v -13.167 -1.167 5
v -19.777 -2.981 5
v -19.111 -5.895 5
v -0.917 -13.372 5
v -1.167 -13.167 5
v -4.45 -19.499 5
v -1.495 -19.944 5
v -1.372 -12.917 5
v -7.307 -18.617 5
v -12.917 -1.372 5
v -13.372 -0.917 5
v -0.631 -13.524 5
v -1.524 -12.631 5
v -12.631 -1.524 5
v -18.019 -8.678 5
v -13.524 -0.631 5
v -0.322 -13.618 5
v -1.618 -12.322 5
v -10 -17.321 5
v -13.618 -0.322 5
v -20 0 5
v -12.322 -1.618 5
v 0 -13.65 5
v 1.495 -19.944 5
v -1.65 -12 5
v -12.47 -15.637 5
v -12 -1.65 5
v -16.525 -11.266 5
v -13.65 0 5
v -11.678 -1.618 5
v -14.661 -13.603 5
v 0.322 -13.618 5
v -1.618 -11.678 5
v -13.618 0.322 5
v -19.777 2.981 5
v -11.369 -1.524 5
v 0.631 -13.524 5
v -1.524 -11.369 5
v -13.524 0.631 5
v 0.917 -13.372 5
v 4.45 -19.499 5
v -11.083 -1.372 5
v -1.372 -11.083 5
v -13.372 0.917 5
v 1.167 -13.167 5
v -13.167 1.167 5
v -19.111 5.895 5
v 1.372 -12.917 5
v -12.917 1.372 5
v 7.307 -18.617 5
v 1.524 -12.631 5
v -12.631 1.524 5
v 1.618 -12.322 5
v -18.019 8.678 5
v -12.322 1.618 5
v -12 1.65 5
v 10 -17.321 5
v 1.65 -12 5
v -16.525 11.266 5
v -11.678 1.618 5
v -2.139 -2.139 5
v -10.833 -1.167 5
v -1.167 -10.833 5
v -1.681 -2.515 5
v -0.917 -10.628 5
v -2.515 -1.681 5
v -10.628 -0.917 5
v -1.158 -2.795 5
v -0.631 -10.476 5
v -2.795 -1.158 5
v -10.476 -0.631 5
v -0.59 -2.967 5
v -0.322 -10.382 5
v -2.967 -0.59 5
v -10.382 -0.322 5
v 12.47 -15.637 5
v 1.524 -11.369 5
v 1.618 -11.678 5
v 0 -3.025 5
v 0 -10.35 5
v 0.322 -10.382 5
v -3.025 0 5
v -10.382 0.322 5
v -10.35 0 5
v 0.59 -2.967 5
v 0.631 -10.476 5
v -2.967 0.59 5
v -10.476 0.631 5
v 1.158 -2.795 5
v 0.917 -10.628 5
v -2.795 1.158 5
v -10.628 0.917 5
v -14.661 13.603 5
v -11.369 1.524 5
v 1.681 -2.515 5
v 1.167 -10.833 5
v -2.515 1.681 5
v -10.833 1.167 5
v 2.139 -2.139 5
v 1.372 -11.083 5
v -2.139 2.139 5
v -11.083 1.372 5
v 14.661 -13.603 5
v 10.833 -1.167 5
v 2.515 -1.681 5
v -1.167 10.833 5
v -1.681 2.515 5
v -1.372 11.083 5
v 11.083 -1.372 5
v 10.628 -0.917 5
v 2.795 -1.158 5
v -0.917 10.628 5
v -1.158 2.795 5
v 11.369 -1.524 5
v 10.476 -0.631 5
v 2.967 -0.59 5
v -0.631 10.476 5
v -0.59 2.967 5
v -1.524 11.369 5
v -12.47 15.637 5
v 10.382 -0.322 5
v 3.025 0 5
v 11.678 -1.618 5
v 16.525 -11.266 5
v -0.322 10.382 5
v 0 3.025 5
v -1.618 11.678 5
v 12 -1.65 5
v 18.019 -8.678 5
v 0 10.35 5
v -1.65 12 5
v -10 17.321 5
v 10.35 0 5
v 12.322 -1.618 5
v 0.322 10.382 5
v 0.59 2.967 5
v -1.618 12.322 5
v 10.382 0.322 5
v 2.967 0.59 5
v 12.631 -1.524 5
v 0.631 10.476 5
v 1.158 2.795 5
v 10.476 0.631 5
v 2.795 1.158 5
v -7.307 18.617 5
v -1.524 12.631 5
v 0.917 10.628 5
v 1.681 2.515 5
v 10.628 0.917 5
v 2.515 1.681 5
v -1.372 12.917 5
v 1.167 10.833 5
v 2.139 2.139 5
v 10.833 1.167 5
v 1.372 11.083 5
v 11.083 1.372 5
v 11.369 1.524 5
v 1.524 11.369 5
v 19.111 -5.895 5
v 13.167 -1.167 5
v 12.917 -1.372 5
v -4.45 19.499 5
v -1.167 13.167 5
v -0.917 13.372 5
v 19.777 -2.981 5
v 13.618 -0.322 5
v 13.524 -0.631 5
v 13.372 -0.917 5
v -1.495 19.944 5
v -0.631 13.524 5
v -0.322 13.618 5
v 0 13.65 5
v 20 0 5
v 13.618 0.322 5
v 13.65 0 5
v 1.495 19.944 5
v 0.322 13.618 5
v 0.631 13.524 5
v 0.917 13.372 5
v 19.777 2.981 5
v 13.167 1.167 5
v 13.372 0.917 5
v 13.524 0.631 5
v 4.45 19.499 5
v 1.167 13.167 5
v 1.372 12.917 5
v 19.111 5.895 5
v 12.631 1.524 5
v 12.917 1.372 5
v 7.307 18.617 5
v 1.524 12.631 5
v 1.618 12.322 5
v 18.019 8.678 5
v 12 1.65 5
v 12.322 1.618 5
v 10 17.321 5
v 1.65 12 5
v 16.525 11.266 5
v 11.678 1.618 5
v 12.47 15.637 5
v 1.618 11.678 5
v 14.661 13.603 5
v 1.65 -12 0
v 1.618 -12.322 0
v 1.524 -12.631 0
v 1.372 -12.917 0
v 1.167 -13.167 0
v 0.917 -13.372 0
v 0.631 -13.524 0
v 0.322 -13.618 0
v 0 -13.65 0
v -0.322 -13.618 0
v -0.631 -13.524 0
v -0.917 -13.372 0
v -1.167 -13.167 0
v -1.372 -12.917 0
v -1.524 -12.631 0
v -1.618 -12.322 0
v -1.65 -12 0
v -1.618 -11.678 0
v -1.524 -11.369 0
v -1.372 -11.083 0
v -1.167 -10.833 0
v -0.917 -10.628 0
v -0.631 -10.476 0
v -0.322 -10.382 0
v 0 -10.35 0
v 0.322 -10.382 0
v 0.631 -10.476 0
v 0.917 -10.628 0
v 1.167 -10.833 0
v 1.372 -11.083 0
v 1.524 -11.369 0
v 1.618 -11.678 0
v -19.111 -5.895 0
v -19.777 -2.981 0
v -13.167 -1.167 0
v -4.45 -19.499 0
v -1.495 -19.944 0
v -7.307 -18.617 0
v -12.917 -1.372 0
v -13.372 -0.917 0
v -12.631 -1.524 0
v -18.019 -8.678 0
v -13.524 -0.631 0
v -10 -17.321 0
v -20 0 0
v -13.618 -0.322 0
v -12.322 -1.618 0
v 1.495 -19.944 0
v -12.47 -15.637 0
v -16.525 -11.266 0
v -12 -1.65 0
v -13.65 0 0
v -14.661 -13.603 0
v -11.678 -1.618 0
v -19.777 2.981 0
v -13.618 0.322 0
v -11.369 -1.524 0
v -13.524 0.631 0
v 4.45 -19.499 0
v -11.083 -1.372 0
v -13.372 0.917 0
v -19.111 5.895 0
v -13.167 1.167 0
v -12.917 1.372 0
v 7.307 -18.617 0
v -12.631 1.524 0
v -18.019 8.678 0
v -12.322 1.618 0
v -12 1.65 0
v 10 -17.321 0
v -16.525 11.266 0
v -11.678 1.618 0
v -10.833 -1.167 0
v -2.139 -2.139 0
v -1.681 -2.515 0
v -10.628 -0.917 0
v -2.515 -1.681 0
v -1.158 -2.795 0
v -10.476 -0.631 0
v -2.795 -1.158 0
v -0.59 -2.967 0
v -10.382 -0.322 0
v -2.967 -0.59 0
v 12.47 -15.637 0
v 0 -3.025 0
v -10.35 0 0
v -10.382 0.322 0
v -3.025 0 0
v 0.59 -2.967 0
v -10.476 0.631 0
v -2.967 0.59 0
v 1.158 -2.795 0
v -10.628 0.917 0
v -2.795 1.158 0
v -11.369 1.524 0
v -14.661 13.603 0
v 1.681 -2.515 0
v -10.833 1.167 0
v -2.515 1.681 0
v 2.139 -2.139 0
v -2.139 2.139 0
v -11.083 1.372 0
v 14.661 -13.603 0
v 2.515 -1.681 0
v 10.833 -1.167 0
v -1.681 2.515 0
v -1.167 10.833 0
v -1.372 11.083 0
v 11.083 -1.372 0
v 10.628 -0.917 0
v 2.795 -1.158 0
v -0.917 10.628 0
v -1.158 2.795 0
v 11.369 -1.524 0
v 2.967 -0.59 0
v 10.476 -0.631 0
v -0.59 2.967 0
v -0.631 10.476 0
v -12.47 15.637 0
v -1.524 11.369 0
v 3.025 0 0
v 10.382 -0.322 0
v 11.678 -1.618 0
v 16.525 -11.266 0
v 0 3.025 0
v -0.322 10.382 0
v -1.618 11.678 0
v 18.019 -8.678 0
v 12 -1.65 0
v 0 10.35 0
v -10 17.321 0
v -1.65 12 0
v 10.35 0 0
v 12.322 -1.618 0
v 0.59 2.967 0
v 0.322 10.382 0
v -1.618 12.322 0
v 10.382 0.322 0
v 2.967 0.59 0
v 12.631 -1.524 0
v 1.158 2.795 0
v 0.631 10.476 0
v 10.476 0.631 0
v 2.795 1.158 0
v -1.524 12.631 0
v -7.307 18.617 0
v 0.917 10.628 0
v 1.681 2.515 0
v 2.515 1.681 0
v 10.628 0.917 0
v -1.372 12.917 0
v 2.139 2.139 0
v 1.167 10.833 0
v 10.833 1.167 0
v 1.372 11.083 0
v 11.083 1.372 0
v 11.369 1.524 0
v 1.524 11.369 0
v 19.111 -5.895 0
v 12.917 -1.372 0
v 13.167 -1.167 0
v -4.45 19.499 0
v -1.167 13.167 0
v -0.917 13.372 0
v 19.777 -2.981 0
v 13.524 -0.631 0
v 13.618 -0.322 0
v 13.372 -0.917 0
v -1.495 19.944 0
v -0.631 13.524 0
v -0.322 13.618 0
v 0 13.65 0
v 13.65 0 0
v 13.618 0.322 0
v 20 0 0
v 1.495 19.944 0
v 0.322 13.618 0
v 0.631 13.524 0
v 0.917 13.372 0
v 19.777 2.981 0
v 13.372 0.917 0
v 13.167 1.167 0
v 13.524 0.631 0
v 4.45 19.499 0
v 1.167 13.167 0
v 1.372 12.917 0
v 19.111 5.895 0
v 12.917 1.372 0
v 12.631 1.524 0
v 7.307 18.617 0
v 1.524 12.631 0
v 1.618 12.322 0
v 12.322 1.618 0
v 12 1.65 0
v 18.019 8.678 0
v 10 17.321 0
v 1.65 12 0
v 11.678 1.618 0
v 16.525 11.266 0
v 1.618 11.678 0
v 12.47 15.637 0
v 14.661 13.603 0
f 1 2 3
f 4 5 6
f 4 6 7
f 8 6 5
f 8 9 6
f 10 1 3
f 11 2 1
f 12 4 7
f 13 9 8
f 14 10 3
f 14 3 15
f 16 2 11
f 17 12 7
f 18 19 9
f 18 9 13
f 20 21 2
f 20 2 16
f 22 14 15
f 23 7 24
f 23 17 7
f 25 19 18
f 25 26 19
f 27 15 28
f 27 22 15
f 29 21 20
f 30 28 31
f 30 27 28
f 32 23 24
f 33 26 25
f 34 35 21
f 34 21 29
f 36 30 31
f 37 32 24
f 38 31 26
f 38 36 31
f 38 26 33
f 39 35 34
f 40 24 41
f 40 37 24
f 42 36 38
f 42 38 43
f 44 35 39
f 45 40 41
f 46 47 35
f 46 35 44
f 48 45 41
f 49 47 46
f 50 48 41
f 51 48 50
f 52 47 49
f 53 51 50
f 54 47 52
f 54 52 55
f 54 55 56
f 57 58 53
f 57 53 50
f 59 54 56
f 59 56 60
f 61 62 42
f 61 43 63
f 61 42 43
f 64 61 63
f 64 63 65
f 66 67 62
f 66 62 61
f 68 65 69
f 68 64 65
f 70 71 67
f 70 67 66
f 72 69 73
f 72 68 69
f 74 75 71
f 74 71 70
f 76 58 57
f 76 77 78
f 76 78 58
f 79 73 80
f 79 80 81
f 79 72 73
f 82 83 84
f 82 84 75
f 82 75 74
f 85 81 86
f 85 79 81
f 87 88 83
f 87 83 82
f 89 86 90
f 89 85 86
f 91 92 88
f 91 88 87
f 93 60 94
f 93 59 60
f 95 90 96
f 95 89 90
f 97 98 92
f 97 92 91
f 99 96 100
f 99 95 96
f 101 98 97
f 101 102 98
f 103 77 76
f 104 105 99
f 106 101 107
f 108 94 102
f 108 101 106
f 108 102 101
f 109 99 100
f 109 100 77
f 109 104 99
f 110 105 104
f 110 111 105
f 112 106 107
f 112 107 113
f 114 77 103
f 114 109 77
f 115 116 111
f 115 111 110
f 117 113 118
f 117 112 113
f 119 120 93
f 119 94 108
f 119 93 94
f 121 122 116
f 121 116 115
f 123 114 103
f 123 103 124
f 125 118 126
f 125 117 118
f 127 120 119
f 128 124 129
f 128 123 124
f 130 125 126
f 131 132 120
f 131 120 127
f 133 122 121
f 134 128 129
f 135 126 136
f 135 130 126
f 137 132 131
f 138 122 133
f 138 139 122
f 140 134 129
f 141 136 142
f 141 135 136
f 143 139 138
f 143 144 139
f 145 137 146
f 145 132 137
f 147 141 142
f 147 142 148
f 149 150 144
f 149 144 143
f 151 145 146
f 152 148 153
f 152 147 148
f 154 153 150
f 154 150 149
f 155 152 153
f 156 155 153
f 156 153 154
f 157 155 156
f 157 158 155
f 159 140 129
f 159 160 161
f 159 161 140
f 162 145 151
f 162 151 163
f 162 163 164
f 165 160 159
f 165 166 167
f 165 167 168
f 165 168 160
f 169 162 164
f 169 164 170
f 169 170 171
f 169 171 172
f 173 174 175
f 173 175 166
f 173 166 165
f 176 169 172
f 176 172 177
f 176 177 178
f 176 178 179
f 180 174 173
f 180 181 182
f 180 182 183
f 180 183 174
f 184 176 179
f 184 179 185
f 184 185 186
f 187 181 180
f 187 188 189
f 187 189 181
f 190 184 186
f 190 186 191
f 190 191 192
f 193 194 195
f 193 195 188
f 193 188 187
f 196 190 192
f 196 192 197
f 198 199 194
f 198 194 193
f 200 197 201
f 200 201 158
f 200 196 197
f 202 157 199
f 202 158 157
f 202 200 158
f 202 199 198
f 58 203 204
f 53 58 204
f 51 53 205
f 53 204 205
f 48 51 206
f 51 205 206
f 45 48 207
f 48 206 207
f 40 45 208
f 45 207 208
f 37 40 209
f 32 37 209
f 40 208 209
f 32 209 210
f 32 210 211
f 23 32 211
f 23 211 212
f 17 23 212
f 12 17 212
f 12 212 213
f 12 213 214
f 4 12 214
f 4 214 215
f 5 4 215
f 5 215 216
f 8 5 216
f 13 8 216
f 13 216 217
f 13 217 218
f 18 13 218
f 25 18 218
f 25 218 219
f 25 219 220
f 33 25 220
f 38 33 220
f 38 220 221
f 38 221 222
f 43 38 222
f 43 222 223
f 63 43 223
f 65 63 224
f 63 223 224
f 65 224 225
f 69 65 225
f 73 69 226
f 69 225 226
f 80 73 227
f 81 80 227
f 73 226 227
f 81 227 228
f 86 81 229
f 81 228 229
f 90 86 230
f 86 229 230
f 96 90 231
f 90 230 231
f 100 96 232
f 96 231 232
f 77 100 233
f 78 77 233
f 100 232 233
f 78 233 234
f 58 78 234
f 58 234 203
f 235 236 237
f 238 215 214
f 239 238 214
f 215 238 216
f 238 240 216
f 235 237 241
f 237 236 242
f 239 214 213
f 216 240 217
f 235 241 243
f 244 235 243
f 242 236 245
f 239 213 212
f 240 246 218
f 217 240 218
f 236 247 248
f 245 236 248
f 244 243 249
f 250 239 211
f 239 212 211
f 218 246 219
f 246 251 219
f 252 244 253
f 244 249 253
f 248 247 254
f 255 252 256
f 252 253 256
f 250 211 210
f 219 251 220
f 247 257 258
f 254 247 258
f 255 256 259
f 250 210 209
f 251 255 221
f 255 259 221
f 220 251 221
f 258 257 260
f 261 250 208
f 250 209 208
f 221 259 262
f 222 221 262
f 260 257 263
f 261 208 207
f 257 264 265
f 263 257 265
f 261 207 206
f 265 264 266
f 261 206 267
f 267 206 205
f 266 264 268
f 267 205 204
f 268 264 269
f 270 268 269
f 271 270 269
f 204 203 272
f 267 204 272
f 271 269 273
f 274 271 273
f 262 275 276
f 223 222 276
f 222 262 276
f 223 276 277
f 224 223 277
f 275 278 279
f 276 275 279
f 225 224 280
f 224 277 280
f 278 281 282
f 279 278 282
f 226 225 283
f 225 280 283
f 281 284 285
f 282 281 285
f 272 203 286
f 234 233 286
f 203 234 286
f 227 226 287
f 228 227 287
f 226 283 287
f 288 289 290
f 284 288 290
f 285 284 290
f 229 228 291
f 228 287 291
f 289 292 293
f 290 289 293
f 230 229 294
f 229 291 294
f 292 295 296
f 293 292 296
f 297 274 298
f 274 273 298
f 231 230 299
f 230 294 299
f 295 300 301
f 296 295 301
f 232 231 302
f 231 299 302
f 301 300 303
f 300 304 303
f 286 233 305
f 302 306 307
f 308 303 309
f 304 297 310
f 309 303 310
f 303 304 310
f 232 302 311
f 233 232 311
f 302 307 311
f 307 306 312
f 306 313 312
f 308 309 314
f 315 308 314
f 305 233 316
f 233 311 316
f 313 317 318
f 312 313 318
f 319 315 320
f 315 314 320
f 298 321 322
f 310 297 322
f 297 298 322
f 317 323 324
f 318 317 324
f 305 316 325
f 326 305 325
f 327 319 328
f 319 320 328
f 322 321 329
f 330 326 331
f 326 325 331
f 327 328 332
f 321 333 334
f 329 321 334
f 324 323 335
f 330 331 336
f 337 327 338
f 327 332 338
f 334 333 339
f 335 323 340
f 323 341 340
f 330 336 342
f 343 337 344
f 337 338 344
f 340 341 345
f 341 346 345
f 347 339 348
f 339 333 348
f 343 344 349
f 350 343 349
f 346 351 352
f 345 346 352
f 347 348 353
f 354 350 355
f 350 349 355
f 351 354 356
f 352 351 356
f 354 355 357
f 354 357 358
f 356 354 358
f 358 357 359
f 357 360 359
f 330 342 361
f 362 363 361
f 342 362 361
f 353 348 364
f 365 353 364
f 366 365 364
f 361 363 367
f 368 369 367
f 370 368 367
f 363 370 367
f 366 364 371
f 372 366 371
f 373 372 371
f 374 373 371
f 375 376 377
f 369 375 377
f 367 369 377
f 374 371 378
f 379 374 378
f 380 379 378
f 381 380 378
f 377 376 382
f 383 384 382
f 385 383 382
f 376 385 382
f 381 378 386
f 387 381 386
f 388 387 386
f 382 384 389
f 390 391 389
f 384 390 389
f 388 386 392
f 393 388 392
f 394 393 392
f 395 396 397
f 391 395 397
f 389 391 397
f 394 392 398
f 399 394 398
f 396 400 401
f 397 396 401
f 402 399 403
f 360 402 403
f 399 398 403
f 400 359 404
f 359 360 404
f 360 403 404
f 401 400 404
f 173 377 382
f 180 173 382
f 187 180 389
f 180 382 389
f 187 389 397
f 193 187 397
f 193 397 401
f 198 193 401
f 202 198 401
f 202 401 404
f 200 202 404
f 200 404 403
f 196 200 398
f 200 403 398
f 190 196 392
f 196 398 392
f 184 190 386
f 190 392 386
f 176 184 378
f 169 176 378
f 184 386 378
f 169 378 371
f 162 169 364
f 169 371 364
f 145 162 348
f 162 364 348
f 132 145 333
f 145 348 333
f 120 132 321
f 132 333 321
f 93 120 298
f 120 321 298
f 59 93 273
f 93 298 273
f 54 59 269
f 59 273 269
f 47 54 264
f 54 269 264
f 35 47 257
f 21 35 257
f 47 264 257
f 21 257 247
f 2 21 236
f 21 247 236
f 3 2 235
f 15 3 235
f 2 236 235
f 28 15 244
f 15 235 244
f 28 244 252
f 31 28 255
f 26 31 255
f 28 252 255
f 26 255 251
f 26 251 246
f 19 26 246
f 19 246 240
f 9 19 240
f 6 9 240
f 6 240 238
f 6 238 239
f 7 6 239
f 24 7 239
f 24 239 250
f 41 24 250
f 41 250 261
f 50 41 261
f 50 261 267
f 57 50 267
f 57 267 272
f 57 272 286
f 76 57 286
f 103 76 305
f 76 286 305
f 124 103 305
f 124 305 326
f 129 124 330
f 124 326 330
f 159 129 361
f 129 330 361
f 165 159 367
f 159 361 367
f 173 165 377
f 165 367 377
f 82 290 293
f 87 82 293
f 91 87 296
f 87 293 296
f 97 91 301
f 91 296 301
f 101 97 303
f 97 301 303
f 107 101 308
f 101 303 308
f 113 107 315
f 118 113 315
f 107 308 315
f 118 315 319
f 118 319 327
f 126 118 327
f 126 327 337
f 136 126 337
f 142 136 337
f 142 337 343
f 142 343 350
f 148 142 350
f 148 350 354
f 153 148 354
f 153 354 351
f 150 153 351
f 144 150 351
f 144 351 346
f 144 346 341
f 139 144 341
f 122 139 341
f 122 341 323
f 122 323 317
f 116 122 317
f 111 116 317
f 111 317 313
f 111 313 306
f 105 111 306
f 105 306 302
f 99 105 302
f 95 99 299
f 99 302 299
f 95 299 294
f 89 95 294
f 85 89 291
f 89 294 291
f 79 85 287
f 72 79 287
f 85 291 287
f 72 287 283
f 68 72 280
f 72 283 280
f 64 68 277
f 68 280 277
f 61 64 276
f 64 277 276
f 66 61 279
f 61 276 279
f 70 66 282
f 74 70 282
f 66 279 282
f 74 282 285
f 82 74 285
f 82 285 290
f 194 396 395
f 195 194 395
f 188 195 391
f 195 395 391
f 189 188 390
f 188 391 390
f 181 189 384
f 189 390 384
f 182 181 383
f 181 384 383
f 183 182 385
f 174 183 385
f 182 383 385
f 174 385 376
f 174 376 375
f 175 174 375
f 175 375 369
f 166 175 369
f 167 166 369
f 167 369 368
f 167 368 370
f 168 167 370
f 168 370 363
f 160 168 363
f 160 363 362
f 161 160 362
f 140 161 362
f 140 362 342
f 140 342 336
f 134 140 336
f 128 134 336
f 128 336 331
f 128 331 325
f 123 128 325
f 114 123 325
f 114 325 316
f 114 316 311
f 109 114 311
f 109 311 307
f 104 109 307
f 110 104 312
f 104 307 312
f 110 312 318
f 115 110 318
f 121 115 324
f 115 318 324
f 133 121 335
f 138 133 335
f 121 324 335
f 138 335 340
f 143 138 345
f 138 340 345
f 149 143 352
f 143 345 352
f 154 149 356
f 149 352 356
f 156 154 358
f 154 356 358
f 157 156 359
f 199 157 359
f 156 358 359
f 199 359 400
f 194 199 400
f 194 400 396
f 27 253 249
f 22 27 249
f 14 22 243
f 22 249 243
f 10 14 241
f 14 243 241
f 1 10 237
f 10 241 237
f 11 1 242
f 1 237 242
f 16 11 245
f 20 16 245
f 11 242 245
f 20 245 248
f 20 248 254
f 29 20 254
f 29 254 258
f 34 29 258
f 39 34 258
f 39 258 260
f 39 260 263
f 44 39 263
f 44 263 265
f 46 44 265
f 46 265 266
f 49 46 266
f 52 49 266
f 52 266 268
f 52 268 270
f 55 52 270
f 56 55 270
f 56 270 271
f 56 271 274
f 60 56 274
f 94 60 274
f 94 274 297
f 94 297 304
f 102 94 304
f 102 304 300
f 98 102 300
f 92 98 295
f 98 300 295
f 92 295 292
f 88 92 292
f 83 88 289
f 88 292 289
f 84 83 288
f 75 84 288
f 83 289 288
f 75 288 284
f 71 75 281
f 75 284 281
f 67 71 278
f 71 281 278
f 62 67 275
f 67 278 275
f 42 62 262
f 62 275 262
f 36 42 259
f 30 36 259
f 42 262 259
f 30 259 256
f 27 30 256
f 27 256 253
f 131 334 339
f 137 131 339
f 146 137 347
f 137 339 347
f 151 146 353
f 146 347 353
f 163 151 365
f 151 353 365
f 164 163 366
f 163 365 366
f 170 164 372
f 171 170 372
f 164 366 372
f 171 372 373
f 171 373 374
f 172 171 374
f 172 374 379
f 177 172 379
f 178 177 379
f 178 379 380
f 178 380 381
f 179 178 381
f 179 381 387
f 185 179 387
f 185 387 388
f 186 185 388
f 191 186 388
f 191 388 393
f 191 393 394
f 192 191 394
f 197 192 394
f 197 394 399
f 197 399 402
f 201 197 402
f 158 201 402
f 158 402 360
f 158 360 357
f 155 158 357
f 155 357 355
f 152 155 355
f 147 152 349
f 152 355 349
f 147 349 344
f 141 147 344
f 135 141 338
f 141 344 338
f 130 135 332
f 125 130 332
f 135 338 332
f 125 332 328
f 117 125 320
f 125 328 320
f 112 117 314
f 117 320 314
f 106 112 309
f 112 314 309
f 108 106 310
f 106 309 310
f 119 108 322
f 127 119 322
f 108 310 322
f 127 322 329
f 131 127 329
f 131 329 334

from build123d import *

# Parameters (mm, degrees)
F0_R            = 20
F1_DEPTH        = 5
F3_D            = 3.3
F3_COPIES_COUNT = 4
F5_D            = 6.05


# Not quite as in the source:
# - a pattern or mirror of a feature is missing from the dataset's text; its kind, count and spacing are read off the source's solid


with BuildPart() as f1:
    # F0 (on Top) → F1 (new body)
    with BuildSketch(Plane.XY):
        Circle(F0_R)
    extrude(amount=F1_DEPTH)

    # F3 (through all)
    with Locations(Plane.XY.offset(5)):
        with Locations((0, 12)):
            f3 = Hole(F3_D / 2)

    # F3_copies: F3 ×4 about axis
    f3_copies_axis = Axis((0, 0, 0), (0, 0, 1))
    for i in range(1, F3_COPIES_COUNT):
        add(f3.rotate(f3_copies_axis, i * 360 / F3_COPIES_COUNT), mode=Mode.SUBTRACT)

    # F5 (through all)
    with Locations(Plane.XY.offset(5)):
        with Locations((0, 0)):
            Hole(F5_D / 2)


solid = f1.part
